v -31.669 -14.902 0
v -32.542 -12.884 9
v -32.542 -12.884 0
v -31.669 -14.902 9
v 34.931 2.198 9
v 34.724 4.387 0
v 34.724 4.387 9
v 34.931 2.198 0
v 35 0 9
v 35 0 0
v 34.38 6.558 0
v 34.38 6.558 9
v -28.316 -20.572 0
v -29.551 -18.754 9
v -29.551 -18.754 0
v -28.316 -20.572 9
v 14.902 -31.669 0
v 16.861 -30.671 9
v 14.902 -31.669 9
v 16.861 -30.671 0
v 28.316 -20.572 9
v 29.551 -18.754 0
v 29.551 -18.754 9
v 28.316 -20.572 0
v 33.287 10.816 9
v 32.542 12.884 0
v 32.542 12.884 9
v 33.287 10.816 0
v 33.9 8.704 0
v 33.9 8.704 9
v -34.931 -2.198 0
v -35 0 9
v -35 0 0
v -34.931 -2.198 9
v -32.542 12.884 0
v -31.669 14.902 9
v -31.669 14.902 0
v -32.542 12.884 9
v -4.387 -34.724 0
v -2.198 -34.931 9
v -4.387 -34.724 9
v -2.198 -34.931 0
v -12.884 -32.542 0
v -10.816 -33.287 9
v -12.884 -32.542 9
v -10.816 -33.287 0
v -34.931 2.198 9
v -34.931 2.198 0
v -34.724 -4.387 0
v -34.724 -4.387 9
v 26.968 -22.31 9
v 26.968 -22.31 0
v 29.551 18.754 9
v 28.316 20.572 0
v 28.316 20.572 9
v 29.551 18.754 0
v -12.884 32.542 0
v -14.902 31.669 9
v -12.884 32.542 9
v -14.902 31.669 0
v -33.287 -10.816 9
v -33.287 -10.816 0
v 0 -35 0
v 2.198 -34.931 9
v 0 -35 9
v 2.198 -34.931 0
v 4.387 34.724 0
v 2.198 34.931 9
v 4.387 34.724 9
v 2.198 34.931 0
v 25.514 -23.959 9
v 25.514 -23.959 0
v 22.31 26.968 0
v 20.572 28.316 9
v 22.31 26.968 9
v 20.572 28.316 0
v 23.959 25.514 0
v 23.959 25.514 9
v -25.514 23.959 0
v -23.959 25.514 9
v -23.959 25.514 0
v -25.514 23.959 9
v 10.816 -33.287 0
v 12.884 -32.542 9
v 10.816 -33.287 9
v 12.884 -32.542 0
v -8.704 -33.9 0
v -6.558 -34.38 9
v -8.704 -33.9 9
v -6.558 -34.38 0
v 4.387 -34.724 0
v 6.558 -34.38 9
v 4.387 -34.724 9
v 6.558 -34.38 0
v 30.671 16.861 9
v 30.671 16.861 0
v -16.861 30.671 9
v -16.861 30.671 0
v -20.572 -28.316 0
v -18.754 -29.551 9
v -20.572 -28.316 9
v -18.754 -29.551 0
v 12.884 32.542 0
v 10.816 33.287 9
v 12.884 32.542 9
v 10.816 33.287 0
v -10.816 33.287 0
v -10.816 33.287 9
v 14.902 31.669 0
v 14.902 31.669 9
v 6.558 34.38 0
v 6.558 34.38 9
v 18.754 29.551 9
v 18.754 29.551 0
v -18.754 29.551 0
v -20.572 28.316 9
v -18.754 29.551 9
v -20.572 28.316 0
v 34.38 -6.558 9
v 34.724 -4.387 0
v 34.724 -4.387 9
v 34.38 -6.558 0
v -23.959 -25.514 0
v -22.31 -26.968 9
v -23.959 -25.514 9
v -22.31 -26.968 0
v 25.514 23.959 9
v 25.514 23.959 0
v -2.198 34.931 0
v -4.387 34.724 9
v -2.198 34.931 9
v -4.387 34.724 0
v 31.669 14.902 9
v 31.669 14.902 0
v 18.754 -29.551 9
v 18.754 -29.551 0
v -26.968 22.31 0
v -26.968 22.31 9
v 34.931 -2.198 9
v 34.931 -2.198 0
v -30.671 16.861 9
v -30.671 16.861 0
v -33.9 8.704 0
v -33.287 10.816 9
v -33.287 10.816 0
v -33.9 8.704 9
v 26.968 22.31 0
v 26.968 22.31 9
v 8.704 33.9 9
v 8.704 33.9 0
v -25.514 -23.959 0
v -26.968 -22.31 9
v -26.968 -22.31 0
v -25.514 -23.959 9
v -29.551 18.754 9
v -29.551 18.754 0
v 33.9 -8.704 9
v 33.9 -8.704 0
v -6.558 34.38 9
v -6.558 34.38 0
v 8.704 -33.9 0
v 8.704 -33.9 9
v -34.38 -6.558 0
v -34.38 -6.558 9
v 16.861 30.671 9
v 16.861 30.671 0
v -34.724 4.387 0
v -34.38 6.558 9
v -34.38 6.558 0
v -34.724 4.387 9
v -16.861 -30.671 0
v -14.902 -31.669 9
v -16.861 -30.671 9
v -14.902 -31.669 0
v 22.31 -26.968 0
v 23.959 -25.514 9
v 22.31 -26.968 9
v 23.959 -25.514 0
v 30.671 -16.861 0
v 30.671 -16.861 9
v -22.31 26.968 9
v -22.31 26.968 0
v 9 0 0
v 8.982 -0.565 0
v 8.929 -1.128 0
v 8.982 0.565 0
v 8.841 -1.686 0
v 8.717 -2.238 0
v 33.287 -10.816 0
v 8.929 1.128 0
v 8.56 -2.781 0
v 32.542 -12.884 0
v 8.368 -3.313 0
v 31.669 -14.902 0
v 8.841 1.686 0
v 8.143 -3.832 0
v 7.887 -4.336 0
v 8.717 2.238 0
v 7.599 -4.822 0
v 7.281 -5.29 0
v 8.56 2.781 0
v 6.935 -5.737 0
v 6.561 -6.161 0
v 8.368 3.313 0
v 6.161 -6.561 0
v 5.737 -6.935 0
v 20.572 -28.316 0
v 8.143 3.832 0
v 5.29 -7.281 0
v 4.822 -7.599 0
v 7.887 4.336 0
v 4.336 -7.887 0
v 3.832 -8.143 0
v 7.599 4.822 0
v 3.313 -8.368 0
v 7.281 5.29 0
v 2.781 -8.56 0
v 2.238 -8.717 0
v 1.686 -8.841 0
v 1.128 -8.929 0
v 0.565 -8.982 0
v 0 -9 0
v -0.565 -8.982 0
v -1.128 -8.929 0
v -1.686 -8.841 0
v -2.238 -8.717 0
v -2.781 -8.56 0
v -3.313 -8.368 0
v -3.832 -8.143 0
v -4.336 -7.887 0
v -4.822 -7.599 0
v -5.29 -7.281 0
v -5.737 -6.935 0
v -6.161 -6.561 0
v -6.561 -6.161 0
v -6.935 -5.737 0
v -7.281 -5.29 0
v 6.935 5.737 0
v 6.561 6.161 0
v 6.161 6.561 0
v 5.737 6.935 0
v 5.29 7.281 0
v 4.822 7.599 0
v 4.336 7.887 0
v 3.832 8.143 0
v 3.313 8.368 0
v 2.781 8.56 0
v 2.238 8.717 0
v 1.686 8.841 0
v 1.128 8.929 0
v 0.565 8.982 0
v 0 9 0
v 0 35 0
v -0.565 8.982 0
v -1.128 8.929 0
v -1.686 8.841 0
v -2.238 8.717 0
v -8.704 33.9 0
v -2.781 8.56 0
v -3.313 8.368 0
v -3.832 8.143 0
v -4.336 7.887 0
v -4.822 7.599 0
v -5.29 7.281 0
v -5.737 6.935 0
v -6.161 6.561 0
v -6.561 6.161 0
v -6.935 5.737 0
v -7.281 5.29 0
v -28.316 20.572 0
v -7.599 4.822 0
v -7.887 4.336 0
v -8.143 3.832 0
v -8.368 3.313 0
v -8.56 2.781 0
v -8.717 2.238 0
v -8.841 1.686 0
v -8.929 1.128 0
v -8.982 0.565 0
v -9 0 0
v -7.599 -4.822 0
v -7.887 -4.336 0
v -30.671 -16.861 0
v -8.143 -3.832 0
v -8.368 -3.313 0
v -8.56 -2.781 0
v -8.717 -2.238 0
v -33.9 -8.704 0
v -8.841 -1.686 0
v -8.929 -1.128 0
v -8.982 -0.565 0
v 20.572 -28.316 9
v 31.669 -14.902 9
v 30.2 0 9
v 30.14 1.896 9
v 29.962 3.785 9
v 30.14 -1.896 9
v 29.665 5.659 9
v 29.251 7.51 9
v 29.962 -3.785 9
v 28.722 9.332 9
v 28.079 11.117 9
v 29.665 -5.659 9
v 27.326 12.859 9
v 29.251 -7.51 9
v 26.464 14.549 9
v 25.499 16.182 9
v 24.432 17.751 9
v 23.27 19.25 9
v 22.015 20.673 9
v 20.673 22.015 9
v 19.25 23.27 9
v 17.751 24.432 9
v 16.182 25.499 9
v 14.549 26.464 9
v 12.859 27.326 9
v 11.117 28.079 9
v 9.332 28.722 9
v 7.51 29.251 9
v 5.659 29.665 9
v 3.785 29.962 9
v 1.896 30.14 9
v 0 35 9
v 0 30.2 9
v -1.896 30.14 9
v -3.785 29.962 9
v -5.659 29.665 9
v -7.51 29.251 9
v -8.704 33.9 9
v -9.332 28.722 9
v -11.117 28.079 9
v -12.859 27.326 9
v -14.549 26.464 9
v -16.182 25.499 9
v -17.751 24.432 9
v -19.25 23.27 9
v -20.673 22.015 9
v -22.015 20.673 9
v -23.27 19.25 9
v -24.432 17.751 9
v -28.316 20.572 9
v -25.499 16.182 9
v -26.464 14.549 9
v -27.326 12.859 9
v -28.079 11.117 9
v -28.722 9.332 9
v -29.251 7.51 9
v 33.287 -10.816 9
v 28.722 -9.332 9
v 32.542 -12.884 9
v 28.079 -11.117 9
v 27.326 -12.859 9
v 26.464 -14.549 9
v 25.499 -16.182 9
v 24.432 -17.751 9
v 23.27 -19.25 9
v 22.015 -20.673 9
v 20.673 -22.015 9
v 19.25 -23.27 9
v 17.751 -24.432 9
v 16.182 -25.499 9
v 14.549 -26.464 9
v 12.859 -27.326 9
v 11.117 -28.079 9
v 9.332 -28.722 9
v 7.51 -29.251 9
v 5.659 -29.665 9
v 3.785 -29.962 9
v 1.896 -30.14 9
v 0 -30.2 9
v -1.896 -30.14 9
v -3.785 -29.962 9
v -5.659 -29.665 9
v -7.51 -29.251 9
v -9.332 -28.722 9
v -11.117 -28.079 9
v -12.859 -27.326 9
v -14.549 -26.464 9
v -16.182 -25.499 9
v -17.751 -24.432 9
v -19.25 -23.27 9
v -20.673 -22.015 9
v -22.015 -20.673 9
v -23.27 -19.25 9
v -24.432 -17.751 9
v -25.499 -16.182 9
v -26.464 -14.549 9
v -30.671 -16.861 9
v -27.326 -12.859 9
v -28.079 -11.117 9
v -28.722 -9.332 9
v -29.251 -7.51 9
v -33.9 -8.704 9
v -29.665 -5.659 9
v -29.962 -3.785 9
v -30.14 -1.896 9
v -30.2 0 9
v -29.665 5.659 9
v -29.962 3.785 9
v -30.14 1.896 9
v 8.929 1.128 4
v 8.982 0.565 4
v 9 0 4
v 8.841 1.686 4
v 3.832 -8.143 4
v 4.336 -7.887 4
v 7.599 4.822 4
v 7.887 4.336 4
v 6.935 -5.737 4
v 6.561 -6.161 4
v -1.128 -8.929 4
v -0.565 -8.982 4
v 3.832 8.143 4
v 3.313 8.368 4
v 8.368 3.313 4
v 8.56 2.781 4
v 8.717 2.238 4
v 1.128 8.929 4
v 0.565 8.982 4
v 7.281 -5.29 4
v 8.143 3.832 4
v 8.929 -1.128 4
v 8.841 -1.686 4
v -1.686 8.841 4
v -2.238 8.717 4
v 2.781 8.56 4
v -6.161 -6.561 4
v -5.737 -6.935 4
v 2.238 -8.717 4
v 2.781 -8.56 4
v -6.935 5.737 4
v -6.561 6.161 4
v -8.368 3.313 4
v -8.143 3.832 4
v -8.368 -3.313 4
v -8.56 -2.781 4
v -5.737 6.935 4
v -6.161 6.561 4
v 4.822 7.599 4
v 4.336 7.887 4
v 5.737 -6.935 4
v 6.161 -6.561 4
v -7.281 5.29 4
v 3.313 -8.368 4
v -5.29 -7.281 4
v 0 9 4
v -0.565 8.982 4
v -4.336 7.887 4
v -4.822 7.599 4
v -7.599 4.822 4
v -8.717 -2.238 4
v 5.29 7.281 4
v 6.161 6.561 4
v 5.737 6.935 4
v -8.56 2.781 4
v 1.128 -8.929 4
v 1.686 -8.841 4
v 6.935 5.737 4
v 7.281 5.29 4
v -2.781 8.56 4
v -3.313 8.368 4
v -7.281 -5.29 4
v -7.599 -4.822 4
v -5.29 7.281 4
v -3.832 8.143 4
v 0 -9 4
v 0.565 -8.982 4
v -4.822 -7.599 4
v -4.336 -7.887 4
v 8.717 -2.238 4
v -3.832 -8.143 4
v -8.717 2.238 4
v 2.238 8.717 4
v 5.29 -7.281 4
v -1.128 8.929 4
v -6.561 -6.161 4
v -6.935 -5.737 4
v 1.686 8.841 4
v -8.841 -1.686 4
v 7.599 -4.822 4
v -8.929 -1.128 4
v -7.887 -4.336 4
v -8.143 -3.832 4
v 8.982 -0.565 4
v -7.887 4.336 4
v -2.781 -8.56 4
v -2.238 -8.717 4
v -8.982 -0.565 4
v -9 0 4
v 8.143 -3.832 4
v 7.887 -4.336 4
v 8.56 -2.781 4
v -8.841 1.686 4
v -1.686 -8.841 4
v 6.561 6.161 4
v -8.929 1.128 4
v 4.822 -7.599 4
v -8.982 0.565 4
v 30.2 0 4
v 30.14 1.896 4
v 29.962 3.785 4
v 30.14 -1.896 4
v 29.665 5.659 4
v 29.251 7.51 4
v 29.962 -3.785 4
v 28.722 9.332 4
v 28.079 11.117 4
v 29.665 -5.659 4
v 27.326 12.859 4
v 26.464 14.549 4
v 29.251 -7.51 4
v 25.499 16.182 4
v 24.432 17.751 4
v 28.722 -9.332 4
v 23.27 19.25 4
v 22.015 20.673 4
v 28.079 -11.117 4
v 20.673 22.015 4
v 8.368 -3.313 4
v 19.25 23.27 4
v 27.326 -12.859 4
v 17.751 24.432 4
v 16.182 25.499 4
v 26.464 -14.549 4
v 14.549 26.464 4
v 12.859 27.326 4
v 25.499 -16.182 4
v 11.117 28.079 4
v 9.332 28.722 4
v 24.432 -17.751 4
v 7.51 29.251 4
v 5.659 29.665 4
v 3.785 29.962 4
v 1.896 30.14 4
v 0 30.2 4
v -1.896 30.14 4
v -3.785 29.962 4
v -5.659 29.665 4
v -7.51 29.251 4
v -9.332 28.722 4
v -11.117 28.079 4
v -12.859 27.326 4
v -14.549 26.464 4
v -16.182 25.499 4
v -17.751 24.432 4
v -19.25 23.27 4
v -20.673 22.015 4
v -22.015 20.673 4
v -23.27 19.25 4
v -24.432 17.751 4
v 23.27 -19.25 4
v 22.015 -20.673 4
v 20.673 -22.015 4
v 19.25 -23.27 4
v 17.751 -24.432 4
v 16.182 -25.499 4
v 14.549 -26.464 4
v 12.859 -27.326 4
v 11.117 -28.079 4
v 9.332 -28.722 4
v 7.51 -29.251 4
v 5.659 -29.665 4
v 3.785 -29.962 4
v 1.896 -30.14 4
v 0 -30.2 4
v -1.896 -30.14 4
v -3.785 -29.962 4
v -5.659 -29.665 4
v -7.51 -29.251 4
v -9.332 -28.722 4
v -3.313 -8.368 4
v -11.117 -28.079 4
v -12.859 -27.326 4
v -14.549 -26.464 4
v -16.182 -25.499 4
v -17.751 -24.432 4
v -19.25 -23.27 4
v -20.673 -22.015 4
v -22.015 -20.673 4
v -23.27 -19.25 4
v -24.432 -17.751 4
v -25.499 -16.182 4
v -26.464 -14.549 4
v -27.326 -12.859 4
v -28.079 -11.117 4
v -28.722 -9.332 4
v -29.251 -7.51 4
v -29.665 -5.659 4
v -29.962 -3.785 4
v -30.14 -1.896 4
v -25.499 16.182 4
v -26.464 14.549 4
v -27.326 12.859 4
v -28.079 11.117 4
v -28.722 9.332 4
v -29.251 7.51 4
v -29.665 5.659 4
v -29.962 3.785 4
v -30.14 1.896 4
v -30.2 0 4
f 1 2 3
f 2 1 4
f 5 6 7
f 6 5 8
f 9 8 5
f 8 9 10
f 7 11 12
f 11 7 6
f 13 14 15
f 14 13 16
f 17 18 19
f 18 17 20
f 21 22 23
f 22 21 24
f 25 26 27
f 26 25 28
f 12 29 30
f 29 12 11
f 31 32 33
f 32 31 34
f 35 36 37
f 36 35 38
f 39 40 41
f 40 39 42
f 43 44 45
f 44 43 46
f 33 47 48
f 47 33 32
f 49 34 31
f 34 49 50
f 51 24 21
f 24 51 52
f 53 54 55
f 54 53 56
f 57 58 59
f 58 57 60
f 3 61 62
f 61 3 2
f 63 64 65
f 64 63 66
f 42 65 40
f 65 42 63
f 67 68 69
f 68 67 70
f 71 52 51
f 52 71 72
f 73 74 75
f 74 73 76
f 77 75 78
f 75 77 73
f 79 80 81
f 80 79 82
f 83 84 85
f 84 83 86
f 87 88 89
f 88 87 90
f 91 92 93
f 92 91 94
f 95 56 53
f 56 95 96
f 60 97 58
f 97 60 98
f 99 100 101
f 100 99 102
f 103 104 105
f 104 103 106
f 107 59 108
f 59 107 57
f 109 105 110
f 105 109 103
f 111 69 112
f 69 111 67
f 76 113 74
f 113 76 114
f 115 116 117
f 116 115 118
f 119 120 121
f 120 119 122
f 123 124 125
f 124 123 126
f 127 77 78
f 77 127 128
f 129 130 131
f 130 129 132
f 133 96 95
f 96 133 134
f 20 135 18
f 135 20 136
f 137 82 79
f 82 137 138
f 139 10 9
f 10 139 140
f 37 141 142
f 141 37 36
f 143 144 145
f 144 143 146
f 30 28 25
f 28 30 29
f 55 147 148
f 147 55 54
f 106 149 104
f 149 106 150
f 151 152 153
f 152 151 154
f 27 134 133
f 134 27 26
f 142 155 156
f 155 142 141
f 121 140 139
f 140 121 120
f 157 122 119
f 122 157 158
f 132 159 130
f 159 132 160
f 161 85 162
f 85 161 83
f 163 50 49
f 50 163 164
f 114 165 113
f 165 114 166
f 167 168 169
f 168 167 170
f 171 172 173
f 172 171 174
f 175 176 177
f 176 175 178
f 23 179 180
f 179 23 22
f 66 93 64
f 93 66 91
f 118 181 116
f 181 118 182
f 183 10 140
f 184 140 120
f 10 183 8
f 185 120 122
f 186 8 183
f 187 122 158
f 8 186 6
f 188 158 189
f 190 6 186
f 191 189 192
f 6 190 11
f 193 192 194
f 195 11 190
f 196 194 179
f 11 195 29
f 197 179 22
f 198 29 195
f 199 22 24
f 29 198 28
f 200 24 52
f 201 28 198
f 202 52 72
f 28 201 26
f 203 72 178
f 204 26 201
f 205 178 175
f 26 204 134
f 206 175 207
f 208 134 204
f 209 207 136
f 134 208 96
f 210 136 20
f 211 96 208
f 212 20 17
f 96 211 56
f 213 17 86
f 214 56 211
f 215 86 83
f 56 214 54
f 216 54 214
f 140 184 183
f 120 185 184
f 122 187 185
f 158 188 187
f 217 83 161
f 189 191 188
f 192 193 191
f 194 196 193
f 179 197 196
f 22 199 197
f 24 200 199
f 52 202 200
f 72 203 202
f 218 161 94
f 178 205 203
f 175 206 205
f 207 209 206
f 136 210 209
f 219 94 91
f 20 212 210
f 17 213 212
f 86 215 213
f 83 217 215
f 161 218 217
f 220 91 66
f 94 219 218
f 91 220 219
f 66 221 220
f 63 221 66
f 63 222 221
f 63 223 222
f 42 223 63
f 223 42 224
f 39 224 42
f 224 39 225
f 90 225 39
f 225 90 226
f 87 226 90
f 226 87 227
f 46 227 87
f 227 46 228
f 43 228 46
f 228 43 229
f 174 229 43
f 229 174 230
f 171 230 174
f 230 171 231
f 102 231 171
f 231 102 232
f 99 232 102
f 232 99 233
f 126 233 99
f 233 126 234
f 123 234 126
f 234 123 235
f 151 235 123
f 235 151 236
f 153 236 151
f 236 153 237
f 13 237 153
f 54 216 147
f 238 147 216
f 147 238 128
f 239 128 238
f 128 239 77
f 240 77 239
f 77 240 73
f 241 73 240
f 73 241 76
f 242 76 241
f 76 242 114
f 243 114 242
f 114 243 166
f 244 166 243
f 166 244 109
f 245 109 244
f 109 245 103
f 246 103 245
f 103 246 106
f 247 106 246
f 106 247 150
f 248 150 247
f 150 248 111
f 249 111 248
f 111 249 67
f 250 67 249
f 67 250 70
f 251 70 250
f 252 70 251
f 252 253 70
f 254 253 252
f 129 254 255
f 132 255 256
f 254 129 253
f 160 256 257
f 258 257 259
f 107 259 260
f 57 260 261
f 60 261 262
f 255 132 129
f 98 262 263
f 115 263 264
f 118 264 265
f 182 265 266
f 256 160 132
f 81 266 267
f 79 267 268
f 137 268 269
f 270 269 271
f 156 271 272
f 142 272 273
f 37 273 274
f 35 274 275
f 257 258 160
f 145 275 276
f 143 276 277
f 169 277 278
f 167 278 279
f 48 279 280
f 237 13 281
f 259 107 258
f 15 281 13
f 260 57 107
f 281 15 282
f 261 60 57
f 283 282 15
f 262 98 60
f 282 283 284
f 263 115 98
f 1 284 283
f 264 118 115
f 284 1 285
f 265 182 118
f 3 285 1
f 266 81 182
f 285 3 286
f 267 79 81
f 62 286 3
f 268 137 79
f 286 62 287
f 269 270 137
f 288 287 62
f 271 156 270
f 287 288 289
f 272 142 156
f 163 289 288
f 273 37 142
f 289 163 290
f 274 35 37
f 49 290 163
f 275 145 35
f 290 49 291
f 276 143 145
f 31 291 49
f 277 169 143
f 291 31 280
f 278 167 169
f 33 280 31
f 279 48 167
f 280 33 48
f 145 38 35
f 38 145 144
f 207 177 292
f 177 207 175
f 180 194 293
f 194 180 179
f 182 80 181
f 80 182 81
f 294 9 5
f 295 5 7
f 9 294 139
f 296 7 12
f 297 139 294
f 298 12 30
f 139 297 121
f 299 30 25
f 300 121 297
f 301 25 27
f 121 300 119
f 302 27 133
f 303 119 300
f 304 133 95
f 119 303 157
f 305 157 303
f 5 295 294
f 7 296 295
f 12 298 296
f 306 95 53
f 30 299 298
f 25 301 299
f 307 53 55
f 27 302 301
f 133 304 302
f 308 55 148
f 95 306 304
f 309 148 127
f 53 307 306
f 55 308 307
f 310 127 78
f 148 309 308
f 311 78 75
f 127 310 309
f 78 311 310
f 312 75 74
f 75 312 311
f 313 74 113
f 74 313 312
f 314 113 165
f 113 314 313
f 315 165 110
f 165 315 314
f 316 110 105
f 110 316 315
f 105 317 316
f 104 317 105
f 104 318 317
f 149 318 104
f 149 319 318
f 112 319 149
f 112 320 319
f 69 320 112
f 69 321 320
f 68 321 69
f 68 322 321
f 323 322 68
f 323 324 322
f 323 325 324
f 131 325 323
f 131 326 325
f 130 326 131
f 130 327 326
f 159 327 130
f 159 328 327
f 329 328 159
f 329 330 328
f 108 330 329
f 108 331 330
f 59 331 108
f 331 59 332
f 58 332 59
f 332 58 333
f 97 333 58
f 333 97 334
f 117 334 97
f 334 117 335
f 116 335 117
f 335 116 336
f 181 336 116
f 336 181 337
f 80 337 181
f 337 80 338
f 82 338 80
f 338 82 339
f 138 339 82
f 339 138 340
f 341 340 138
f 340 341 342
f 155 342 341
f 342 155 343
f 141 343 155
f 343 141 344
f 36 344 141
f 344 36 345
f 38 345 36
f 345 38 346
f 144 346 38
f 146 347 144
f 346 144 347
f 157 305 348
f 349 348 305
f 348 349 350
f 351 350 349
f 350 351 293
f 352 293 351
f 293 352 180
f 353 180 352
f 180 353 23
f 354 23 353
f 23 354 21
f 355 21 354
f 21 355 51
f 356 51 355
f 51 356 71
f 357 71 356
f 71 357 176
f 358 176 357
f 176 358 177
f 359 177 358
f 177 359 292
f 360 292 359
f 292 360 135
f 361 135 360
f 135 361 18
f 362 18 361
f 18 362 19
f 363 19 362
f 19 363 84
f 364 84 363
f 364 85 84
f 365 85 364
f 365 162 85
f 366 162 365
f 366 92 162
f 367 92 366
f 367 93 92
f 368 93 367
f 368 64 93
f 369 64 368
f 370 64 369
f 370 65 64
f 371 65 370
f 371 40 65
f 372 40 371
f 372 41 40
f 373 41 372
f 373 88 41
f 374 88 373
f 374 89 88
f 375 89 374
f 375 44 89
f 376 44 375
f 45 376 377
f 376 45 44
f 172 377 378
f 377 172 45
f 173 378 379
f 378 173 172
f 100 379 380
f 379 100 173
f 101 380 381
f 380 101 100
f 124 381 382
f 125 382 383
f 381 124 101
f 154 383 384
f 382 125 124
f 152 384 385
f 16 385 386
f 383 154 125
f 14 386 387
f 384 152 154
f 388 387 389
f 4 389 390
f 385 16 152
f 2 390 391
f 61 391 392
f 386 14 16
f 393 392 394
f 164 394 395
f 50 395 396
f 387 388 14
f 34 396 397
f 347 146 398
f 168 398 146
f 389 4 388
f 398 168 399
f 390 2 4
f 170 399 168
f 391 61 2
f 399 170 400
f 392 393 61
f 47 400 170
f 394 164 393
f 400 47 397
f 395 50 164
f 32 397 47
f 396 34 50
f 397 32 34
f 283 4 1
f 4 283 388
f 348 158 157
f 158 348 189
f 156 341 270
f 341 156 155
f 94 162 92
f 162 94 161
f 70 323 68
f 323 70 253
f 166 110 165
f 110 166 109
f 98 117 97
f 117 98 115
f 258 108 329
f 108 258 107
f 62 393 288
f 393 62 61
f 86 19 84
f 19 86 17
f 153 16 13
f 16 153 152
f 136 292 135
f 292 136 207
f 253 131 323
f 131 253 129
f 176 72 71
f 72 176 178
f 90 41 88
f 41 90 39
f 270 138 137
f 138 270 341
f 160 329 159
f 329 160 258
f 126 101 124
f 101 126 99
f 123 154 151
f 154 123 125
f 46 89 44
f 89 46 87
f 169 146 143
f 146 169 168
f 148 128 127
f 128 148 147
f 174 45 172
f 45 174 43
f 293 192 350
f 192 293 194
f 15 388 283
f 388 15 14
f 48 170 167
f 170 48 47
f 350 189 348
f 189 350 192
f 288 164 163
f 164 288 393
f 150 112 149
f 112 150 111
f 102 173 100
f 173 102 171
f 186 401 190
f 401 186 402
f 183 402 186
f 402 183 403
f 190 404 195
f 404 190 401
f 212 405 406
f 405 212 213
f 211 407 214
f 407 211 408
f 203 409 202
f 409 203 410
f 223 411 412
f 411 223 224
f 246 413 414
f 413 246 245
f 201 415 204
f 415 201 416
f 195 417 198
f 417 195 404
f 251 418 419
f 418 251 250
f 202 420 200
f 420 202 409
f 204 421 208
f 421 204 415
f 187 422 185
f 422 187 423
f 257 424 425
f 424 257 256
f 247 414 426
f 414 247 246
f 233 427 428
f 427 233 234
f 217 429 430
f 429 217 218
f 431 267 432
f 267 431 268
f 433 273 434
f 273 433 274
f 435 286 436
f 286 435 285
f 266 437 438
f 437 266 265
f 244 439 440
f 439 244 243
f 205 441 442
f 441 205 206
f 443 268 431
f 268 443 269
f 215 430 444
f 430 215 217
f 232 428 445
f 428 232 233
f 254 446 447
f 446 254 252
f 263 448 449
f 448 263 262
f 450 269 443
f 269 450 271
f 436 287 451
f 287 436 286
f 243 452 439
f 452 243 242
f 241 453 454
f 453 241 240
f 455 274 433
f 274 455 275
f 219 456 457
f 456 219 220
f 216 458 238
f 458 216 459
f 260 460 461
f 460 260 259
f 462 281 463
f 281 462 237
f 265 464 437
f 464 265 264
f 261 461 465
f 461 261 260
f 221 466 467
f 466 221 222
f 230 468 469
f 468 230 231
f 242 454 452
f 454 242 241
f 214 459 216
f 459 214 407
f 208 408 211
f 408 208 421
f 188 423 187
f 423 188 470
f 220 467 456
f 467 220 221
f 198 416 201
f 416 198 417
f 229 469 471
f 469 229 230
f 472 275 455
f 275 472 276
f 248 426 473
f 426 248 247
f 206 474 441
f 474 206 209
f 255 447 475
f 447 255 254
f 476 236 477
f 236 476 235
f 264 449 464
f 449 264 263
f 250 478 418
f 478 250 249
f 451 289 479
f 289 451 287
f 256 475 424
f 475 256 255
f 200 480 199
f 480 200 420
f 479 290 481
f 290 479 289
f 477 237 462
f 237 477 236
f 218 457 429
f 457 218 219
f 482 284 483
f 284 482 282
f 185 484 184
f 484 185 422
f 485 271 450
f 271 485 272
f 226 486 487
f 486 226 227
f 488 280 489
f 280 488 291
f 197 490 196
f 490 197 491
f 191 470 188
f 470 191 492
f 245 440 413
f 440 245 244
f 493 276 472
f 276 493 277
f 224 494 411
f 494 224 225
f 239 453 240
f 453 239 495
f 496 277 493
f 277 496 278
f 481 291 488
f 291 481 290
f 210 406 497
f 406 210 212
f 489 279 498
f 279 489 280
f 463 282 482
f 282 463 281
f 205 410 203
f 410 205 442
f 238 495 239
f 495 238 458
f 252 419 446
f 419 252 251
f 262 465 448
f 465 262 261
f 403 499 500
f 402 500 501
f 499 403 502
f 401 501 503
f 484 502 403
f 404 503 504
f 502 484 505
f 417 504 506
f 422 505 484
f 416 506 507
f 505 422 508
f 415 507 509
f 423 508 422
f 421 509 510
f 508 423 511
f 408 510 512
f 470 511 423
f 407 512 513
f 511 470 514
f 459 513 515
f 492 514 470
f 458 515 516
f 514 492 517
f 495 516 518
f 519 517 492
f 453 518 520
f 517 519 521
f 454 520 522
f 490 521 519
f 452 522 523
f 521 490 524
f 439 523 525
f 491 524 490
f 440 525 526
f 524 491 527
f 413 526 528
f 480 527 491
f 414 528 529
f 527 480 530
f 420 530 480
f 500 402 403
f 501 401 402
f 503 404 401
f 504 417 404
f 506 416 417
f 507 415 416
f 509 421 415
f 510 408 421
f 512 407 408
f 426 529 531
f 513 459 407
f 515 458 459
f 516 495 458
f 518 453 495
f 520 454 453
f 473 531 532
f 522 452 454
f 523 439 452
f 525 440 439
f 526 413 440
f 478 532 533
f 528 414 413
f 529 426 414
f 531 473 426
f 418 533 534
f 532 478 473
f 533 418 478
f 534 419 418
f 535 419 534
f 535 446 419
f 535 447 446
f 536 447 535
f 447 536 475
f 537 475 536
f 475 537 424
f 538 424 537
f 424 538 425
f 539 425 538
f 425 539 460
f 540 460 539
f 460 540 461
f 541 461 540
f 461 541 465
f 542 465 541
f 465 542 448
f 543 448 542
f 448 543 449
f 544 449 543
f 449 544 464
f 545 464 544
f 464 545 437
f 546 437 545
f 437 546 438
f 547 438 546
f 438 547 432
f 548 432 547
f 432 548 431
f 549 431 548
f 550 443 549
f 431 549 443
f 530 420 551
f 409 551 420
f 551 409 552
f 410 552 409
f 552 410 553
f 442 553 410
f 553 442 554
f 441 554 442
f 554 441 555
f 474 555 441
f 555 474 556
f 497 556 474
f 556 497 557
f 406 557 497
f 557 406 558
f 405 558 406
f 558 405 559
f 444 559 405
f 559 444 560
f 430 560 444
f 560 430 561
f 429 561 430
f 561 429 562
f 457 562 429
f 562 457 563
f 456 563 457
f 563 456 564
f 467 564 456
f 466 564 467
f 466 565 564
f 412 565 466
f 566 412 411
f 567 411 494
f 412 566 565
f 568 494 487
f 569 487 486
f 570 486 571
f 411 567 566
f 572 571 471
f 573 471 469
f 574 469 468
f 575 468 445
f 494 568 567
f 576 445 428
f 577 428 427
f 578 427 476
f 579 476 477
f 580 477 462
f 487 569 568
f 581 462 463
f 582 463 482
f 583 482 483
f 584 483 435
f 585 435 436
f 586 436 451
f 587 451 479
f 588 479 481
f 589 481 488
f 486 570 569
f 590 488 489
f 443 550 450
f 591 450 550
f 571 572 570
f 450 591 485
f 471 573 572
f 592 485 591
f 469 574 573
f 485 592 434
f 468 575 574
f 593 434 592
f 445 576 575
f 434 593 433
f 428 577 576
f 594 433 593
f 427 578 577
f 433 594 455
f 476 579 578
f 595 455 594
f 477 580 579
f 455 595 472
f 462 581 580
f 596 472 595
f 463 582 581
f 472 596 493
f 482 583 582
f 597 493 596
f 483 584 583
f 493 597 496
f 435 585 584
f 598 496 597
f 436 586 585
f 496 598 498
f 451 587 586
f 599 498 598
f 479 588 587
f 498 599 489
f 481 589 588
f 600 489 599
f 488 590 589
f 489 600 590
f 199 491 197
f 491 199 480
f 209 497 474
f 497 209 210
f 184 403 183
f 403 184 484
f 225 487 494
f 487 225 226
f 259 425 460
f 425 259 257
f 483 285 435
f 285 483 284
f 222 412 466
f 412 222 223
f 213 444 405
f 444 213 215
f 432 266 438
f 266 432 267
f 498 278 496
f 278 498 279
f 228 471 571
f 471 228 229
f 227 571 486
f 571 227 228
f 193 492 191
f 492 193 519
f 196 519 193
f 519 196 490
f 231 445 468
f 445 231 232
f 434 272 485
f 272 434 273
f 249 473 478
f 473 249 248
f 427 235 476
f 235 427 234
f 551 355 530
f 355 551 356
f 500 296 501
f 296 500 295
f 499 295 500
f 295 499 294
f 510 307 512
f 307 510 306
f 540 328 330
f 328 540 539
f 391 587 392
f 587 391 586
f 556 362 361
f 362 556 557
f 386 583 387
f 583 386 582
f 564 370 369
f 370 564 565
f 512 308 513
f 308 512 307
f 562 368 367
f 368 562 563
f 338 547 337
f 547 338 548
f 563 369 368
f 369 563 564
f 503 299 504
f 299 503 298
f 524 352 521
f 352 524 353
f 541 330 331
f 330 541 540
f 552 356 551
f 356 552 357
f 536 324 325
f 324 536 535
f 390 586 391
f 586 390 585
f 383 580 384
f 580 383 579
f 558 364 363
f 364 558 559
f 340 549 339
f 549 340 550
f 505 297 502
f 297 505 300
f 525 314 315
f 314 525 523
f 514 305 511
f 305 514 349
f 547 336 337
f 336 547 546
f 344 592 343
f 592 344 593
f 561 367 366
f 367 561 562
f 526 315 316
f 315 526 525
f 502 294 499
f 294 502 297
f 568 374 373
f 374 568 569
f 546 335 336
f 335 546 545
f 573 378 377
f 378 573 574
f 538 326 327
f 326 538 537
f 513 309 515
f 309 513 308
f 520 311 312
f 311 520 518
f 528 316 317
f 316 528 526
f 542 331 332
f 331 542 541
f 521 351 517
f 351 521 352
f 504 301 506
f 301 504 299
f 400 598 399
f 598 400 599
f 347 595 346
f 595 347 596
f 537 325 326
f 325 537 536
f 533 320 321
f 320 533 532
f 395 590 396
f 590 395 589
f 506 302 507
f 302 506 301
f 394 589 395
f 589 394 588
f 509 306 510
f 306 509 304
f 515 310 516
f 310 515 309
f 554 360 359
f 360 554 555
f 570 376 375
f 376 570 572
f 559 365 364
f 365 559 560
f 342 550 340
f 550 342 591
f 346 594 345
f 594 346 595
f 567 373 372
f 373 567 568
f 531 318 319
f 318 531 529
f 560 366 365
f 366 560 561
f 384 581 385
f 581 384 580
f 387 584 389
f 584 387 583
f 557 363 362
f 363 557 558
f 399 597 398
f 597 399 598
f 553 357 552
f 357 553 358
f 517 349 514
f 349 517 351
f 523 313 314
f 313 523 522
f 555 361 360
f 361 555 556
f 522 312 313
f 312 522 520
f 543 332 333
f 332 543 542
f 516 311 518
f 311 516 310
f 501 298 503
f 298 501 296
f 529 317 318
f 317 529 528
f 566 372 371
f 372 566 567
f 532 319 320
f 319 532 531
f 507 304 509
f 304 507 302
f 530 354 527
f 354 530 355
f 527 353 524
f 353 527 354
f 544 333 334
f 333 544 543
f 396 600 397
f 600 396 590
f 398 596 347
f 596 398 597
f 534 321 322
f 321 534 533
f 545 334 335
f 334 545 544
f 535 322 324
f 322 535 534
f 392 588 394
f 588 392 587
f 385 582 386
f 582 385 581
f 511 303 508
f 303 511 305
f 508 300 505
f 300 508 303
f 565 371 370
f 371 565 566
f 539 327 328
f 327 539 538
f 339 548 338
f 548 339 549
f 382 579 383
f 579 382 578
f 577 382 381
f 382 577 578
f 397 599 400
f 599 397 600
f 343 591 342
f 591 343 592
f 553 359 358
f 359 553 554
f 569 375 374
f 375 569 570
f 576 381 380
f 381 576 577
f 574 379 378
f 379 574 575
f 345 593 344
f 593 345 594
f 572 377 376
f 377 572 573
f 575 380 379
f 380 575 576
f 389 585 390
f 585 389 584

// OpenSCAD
NUB_DIA = 18;
NUB_THICKNESS = 4;
PLATE_DIA = 60.4;
PLATE_THICKNESS = 5;
BASE_DIA = 70;
BASE_THICKNESS = NUB_THICKNESS+PLATE_THICKNESS;

$fn = 100;

difference() {
    cylinder(d = BASE_DIA, h = BASE_THICKNESS);
    cylinder(d = NUB_DIA, h = NUB_THICKNESS);
    translate([0, 0, NUB_THICKNESS])
    cylinder(d = PLATE_DIA, h = PLATE_THICKNESS);
}
